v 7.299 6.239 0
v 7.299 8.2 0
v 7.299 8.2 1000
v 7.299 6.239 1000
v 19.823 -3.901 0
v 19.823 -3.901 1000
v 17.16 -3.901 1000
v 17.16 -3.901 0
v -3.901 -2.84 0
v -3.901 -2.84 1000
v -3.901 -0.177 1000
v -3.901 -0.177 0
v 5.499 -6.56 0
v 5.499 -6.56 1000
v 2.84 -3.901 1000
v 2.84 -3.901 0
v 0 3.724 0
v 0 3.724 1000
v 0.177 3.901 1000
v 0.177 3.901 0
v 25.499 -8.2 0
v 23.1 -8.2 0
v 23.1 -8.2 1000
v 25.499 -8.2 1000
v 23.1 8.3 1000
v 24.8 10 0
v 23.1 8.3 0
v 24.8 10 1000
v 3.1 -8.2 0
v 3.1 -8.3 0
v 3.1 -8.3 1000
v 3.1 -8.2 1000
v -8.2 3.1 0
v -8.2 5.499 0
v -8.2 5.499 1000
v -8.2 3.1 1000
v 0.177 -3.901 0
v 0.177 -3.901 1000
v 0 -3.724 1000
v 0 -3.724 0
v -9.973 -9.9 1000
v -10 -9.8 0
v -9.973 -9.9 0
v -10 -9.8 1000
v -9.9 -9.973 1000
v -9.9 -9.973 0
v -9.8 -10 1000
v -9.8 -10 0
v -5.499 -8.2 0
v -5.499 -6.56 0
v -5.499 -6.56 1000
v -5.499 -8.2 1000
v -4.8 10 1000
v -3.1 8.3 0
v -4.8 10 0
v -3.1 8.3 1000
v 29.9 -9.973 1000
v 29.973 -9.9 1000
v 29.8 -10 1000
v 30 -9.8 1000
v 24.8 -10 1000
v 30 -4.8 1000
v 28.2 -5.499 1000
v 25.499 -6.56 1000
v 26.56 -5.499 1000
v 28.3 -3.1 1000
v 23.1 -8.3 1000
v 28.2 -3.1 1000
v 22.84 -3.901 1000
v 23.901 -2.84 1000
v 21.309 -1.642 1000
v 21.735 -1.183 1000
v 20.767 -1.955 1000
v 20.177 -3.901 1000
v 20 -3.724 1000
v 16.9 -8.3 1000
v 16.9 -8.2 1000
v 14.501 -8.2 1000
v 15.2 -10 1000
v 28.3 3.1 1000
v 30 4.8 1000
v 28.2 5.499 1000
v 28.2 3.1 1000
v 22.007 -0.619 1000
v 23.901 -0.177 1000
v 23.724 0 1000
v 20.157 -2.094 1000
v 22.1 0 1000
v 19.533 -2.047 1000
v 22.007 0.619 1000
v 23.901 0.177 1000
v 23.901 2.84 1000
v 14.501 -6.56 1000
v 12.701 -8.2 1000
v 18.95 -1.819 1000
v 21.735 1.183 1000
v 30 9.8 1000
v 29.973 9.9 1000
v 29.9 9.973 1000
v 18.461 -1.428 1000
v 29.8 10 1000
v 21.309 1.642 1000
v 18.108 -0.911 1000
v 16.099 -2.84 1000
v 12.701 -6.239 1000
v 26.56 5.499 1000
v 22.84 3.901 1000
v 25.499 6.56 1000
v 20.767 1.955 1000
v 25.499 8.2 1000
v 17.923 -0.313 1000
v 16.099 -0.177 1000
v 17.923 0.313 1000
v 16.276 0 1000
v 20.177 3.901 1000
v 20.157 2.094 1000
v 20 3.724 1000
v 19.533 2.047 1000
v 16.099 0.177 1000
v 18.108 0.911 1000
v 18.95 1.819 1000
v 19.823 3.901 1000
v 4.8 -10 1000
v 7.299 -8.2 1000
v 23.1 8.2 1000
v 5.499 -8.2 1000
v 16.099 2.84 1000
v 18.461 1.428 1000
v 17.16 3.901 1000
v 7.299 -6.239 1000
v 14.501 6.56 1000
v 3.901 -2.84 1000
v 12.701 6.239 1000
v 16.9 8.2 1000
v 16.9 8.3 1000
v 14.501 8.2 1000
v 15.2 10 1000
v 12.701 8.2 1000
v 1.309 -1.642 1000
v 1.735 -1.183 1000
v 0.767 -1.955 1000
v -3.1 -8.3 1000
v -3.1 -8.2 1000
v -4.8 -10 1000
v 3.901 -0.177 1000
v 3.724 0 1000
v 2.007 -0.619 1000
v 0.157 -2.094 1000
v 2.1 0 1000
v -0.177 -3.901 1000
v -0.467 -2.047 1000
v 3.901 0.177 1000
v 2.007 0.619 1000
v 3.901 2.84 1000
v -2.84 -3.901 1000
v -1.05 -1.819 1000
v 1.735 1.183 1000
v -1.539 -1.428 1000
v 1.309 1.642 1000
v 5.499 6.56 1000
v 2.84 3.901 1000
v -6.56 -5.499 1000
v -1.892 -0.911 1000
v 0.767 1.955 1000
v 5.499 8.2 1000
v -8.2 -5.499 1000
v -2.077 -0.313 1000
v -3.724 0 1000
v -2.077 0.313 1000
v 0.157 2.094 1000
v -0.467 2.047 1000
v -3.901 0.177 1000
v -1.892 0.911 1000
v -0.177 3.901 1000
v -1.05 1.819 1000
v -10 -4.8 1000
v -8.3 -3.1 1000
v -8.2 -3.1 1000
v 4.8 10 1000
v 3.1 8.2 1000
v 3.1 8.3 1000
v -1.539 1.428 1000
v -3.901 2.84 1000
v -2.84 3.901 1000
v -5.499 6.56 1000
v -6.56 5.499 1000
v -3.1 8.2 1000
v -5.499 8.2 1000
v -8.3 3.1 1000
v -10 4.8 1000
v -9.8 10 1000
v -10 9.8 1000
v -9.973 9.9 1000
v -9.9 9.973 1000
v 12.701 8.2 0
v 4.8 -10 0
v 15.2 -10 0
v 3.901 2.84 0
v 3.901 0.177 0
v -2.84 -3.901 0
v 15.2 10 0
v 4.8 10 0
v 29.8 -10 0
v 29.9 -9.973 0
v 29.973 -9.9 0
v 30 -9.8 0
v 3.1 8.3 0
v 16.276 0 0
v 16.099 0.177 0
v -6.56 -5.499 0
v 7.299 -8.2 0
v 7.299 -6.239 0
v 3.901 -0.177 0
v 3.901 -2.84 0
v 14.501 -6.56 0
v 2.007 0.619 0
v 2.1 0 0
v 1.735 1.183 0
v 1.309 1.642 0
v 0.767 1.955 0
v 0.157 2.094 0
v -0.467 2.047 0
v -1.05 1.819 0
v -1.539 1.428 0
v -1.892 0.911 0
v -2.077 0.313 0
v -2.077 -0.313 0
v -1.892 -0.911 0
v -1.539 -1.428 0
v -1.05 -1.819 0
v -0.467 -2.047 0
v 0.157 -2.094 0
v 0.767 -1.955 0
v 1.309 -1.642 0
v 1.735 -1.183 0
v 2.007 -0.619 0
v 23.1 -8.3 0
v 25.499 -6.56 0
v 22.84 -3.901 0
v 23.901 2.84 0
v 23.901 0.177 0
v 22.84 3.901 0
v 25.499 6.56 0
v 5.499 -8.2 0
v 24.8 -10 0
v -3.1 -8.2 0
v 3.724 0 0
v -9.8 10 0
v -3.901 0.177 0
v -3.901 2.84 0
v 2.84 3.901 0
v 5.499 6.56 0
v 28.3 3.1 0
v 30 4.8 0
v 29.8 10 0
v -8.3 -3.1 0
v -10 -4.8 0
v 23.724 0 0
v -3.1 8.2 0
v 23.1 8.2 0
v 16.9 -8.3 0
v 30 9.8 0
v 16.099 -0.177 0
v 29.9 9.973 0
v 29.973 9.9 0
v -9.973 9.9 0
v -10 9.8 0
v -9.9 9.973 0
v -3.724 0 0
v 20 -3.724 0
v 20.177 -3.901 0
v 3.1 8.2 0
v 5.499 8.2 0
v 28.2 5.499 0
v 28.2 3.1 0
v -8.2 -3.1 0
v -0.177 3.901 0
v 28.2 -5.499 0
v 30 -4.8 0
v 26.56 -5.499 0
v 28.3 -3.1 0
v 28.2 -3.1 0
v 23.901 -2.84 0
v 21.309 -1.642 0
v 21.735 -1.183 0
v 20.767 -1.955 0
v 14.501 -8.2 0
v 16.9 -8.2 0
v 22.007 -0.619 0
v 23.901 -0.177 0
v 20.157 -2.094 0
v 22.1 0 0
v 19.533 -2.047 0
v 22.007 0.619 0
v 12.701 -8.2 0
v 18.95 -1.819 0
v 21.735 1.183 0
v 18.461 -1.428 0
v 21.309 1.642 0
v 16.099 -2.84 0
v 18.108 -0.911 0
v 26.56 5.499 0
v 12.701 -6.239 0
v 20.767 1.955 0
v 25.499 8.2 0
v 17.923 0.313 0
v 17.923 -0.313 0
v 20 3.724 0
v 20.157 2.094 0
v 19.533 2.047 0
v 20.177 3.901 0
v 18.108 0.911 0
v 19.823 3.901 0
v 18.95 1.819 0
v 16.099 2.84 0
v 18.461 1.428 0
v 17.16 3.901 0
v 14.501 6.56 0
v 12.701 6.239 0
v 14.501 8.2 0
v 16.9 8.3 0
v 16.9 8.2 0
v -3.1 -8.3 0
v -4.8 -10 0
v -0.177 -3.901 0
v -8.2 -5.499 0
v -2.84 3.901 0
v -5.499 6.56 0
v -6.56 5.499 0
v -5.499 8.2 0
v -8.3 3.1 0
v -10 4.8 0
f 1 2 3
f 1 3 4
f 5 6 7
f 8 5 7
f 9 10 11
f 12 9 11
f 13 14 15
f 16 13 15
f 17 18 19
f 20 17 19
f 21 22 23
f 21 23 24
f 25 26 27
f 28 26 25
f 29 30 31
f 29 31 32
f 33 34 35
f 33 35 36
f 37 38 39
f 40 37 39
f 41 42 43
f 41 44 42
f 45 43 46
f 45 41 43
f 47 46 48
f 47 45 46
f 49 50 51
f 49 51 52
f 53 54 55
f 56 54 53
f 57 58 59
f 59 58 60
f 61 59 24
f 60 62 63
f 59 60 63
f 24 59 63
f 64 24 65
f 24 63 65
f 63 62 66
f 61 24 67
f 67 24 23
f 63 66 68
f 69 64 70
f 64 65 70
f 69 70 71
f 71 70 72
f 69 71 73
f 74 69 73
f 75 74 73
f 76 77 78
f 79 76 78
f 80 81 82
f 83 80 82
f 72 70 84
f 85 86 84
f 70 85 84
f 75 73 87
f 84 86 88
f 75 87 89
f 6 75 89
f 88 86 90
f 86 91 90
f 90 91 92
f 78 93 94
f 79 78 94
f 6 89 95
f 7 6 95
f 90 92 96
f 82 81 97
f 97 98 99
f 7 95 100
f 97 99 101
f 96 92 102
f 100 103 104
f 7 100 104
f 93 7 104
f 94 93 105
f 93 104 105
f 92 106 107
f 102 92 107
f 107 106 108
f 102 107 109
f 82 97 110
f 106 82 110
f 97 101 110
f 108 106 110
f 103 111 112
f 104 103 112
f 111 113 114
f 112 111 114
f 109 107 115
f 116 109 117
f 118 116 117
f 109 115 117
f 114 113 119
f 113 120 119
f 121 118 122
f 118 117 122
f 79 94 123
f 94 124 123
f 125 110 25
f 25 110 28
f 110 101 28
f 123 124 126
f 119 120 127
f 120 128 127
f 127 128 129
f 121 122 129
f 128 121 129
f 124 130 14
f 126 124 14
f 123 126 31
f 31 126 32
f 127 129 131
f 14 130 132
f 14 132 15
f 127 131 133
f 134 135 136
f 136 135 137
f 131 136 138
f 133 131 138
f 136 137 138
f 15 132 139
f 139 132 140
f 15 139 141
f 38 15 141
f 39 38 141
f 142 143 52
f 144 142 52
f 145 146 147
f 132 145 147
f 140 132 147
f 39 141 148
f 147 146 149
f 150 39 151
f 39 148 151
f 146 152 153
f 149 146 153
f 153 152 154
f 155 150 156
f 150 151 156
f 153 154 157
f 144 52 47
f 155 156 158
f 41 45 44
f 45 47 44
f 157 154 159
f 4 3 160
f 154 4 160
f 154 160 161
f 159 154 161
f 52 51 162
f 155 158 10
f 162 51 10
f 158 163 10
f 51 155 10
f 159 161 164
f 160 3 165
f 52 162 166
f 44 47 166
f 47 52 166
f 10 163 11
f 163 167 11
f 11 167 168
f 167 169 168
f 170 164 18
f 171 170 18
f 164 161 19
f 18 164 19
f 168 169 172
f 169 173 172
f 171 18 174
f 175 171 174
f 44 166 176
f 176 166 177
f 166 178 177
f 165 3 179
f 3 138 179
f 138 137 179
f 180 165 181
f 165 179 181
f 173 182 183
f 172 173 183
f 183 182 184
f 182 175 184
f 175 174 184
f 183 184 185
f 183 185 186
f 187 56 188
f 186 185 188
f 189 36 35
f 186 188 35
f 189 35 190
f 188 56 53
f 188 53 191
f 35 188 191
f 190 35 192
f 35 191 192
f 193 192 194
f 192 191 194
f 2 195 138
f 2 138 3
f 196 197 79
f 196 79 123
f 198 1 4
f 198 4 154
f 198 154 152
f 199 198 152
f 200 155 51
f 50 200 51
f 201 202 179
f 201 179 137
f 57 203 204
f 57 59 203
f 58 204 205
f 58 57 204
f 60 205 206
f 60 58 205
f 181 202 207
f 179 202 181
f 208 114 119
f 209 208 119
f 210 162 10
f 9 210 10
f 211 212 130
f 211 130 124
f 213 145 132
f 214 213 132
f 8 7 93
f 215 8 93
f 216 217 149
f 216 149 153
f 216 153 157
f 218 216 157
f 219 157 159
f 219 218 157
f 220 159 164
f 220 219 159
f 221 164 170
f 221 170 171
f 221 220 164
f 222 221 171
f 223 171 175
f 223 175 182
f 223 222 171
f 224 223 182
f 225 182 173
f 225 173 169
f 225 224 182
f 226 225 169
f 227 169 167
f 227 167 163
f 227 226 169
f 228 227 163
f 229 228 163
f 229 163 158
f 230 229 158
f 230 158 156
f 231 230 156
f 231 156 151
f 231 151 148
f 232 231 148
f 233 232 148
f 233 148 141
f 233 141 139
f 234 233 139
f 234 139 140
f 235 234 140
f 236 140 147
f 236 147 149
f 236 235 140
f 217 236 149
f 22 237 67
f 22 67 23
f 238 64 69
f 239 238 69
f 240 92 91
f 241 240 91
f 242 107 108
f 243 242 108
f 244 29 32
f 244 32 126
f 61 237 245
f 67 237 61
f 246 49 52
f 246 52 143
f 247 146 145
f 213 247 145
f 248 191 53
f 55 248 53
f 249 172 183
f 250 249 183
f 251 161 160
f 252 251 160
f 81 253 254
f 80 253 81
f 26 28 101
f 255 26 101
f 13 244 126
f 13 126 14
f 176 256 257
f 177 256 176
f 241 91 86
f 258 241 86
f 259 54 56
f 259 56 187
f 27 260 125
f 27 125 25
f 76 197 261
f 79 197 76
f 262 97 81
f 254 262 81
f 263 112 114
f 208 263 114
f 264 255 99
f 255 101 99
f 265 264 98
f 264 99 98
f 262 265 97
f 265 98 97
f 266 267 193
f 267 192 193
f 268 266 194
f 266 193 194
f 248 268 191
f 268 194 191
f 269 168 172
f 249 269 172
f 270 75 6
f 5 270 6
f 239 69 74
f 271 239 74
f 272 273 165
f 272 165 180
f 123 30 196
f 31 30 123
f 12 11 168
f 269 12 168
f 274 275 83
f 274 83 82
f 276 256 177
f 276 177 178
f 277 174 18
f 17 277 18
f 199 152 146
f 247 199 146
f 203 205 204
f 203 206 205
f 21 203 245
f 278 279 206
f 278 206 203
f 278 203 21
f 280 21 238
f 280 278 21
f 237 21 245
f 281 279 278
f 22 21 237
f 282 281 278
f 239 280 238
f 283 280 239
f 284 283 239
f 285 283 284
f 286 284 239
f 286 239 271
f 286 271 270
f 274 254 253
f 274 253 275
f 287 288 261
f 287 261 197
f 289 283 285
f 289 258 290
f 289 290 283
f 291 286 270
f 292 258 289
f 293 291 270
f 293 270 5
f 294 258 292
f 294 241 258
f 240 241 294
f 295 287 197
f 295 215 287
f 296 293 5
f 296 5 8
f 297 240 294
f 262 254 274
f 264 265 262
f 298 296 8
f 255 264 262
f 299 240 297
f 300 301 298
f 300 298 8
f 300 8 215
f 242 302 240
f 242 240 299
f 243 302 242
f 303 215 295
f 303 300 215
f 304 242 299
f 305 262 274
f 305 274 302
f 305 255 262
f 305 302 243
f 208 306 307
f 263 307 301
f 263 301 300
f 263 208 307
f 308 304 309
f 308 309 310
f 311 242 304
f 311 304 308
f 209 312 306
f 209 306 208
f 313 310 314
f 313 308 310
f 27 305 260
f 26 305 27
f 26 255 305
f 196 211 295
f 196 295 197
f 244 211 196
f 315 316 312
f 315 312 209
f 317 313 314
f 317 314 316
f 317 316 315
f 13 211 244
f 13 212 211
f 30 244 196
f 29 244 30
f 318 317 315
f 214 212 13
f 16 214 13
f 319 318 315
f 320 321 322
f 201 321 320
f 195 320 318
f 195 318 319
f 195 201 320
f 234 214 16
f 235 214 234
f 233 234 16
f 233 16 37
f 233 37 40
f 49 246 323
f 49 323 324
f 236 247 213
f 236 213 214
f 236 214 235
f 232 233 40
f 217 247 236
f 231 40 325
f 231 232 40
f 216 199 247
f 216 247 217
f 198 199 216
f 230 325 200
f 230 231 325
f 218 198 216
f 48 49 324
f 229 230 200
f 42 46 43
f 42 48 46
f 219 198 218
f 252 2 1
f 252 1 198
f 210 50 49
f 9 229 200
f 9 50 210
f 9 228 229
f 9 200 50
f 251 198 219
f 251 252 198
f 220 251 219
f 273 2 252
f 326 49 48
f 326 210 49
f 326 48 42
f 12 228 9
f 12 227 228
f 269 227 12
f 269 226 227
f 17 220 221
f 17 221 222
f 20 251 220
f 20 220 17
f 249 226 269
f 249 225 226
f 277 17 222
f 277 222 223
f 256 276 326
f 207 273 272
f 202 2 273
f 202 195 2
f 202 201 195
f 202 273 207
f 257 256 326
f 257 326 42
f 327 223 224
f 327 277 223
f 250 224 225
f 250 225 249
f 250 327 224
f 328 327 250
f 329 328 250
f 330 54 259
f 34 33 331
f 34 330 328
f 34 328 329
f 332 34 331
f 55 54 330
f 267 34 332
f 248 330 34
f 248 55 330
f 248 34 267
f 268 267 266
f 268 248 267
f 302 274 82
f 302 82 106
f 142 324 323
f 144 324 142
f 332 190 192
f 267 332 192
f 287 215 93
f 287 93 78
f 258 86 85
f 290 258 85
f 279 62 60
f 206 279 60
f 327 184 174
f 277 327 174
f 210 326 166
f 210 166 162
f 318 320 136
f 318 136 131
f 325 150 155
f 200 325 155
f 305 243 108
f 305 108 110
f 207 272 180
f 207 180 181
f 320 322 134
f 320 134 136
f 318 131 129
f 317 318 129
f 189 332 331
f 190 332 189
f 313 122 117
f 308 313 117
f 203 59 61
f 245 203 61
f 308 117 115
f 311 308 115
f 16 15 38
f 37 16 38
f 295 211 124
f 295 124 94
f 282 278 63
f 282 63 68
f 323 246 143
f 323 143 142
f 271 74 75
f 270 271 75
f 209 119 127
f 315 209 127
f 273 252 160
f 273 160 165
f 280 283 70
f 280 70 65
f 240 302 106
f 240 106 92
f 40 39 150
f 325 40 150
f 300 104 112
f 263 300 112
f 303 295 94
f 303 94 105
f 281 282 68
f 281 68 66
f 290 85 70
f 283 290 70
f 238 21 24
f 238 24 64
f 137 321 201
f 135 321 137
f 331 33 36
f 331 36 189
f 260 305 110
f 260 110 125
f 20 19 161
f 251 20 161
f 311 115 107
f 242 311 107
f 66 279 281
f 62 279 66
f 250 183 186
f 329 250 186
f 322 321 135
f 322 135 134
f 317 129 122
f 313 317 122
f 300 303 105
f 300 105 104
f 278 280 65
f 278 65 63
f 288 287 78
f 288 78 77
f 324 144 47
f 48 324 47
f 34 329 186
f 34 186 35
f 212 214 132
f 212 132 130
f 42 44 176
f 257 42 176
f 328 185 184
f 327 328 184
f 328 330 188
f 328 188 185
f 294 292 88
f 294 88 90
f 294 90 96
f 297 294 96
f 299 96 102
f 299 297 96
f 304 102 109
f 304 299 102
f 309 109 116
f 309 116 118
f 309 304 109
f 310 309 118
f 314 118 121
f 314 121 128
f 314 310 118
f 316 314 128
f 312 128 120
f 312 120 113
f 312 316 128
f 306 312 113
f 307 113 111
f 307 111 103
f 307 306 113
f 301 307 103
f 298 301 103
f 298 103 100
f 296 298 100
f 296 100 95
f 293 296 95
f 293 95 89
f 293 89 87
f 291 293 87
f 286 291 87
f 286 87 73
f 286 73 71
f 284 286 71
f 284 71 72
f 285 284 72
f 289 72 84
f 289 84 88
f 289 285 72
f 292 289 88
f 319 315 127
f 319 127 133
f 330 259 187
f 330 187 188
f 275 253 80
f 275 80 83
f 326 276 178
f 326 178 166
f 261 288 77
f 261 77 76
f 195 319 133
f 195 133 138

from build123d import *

# Parameters (mm, degrees)
SKETCH_R         = 2.1
PAD_DEPTH        = 1000
CHAMFER_1_ANGLE  = 45
CHAMFER_1_SIZE   = 1.7
CHAMFER_2_ANGLE  = 45
CHAMFER_2_SIZE   = 1.7
CHAMFER_3_ANGLE  = 45
CHAMFER_3_SIZE   = 1.7
CHAMFER_4_ANGLE  = 45
CHAMFER_4_SIZE   = 1.7
CHAMFER_5_ANGLE  = 45
CHAMFER_5_SIZE   = 1.7
CHAMFER_6_ANGLE  = 45
CHAMFER_6_SIZE   = 1.7
CHAMFER_7_ANGLE  = 45
CHAMFER_7_SIZE   = 1.7
CHAMFER_8_ANGLE  = 45
CHAMFER_8_SIZE   = 1.7
CHAMFER_9_ANGLE  = 45
CHAMFER_9_SIZE   = 1.7
CHAMFER_10_ANGLE = 45
CHAMFER_10_SIZE  = 1.7
CHAMFER_11_ANGLE = 45
CHAMFER_11_SIZE  = 1.7
CHAMFER_12_ANGLE = 45
CHAMFER_12_SIZE  = 1.7
FILLET_R         = 0.2


with BuildPart() as part:
    # Sketch → Pad (new body)
    with BuildSketch(Plane.XY):
        Polygon((0, 3.723883), (0.176777, 3.90066), (2.84, 3.90066), (5.49934, 6.56), (5.49934, 8.2), (3.1, 8.2), (3.1, 10), (16.9, 10), (16.9, 8.2), (14.50066, 8.2), (14.50066, 6.56), (17.16, 3.90066), (19.823223, 3.90066), (20, 3.723883), (20.176777, 3.90066), (22.84, 3.90066), (25.49934, 6.56), (25.49934, 8.2), (23.1, 8.2), (23.1, 10), (30, 10), (30, 3.1), (28.2, 3.1), (28.2, 5.49934), (26.56, 5.49934), (23.90066, 2.84), (23.90066, 0.176777), (23.723883, 0), (23.90066, -0.176777), (23.90066, -2.84), (26.56, -5.49934), (28.2, -5.49934), (28.2, -3.1), (30, -3.1), (30, -10), (23.1, -10), (23.1, -8.2), (25.49934, -8.2), (25.49934, -6.56), (22.84, -3.90066), (20.176777, -3.90066), (20, -3.723883), (19.823223, -3.90066), (17.16, -3.90066), (14.50066, -6.56), (14.50066, -8.2), (16.9, -8.2), (16.9, -10), (3.1, -10), (3.1, -8.2), (5.49934, -8.2), (5.49934, -6.56), (2.84, -3.90066), (0.176777, -3.90066), (0, -3.723883), (-0.176777, -3.90066), (-2.84, -3.90066), (-5.49934, -6.56), (-5.49934, -8.2), (-3.1, -8.2), (-3.1, -10), (-10, -10), (-10, -3.1), (-8.2, -3.1), (-8.2, -5.49934), (-6.56, -5.49934), (-3.90066, -2.84), (-3.90066, -0.176777), (-3.723883, 0), (-3.90066, 0.176777), (-3.90066, 2.84), (-6.56, 5.49934), (-8.2, 5.49934), (-8.2, 3.1), (-10, 3.1), (-10, 10), (-3.1, 10), (-3.1, 8.2), (-5.49934, 8.2), (-5.49934, 6.56), (-2.84, 3.90066), (-0.176777, 3.90066), align=None)
        Circle(SKETCH_R, mode=Mode.SUBTRACT)
        with Locations((20, 0)):
            Circle(SKETCH_R, mode=Mode.SUBTRACT)
        Polygon((7.29934, 6.23868), (3.90066, 2.84), (3.90066, 0.176777), (3.723883, 0), (3.90066, -0.176777), (3.90066, -2.84), (7.29934, -6.23868), (7.29934, -8.2), (12.70066, -8.2), (12.70066, -6.23868), (16.09934, -2.84), (16.09934, -0.176777), (16.276117, 0), (16.09934, 0.176777), (16.09934, 2.84), (12.70066, 6.23868), (12.70066, 8.2), (7.29934, 8.2), align=None, mode=Mode.SUBTRACT)
    extrude(amount=PAD_DEPTH)

    # Chamfer 1
    chamfer_1_edges = [part.edges().sort_by_distance(p)[0] for p in [
        (3.1, -10, 500),
    ]]
    chamfer_1_side = part.faces().sort_by_distance((10, -10, 500))[0]
    chamfer(chamfer_1_edges, length=CHAMFER_1_SIZE, angle=CHAMFER_1_ANGLE, reference=chamfer_1_side)

    # Chamfer 2
    chamfer_2_edges = [part.edges().sort_by_distance(p)[0] for p in [
        (16.9, -10, 500),
    ]]
    chamfer_2_side = part.faces().sort_by_distance((16.9, -9.1, 500))[0]
    chamfer(chamfer_2_edges, length=CHAMFER_2_SIZE, angle=CHAMFER_2_ANGLE, reference=chamfer_2_side)

    # Chamfer 3
    chamfer_3_edges = [part.edges().sort_by_distance(p)[0] for p in [
        (23.1, -10, 500),
    ]]
    chamfer_3_side = part.faces().sort_by_distance((26.55, -10, 500))[0]
    chamfer(chamfer_3_edges, length=CHAMFER_3_SIZE, angle=CHAMFER_3_ANGLE, reference=chamfer_3_side)

    # Chamfer 4
    chamfer_4_edges = [part.edges().sort_by_distance(p)[0] for p in [
        (-3.1, -10, 500),
    ]]
    chamfer_4_side = part.faces().sort_by_distance((-3.1, -9.1, 500))[0]
    chamfer(chamfer_4_edges, length=CHAMFER_4_SIZE, angle=CHAMFER_4_ANGLE, reference=chamfer_4_side)

    # Chamfer 5
    chamfer_5_edges = [part.edges().sort_by_distance(p)[0] for p in [
        (30, -3.1, 500),
    ]]
    chamfer_5_side = part.faces().sort_by_distance((29.1, -3.1, 500))[0]
    chamfer(chamfer_5_edges, length=CHAMFER_5_SIZE, angle=CHAMFER_5_ANGLE, reference=chamfer_5_side)

    # Chamfer 6
    chamfer_6_edges = [part.edges().sort_by_distance(p)[0] for p in [
        (30, 3.1, 500),
    ]]
    chamfer_6_side = part.faces().sort_by_distance((30, 6.55, 500))[0]
    chamfer(chamfer_6_edges, length=CHAMFER_6_SIZE, angle=CHAMFER_6_ANGLE, reference=chamfer_6_side)

    # Chamfer 7
    chamfer_7_edges = [part.edges().sort_by_distance(p)[0] for p in [
        (23.1, 10, 500),
    ]]
    chamfer_7_side = part.faces().sort_by_distance((23.1, 9.1, 500))[0]
    chamfer(chamfer_7_edges, length=CHAMFER_7_SIZE, angle=CHAMFER_7_ANGLE, reference=chamfer_7_side)

    # Chamfer 8
    chamfer_8_edges = [part.edges().sort_by_distance(p)[0] for p in [
        (16.9, 10, 500),
    ]]
    chamfer_8_side = part.faces().sort_by_distance((10, 10, 500))[0]
    chamfer(chamfer_8_edges, length=CHAMFER_8_SIZE, angle=CHAMFER_8_ANGLE, reference=chamfer_8_side)

    # Chamfer 9
    chamfer_9_edges = [part.edges().sort_by_distance(p)[0] for p in [
        (3.1, 10, 500),
    ]]
    chamfer_9_side = part.faces().sort_by_distance((3.1, 9.1, 500))[0]
    chamfer(chamfer_9_edges, length=CHAMFER_9_SIZE, angle=CHAMFER_9_ANGLE, reference=chamfer_9_side)

    # Chamfer 10
    chamfer_10_edges = [part.edges().sort_by_distance(p)[0] for p in [
        (-3.1, 10, 500),
    ]]
    chamfer_10_side = part.faces().sort_by_distance((-6.55, 10, 500))[0]
    chamfer(chamfer_10_edges, length=CHAMFER_10_SIZE, angle=CHAMFER_10_ANGLE, reference=chamfer_10_side)

    # Chamfer 11
    chamfer_11_edges = [part.edges().sort_by_distance(p)[0] for p in [
        (-10, -3.1, 500),
    ]]
    chamfer_11_side = part.faces().sort_by_distance((-10, -6.55, 500))[0]
    chamfer(chamfer_11_edges, length=CHAMFER_11_SIZE, angle=CHAMFER_11_ANGLE, reference=chamfer_11_side)

    # Chamfer 12
    chamfer_12_edges = [part.edges().sort_by_distance(p)[0] for p in [
        (-10, 3.1, 500),
    ]]
    chamfer_12_side = part.faces().sort_by_distance((-9.1, 3.1, 500))[0]
    chamfer(chamfer_12_edges, length=CHAMFER_12_SIZE, angle=CHAMFER_12_ANGLE, reference=chamfer_12_side)

    # Fillet
    fillet_edges = [part.edges().sort_by_distance(p)[0] for p in [
        (-10, -10, 500),
        (-10, 10, 500),
        (30, 10, 500),
        (30, -10, 500),
    ]]
    fillet(fillet_edges, radius=FILLET_R)


solid = part.part
